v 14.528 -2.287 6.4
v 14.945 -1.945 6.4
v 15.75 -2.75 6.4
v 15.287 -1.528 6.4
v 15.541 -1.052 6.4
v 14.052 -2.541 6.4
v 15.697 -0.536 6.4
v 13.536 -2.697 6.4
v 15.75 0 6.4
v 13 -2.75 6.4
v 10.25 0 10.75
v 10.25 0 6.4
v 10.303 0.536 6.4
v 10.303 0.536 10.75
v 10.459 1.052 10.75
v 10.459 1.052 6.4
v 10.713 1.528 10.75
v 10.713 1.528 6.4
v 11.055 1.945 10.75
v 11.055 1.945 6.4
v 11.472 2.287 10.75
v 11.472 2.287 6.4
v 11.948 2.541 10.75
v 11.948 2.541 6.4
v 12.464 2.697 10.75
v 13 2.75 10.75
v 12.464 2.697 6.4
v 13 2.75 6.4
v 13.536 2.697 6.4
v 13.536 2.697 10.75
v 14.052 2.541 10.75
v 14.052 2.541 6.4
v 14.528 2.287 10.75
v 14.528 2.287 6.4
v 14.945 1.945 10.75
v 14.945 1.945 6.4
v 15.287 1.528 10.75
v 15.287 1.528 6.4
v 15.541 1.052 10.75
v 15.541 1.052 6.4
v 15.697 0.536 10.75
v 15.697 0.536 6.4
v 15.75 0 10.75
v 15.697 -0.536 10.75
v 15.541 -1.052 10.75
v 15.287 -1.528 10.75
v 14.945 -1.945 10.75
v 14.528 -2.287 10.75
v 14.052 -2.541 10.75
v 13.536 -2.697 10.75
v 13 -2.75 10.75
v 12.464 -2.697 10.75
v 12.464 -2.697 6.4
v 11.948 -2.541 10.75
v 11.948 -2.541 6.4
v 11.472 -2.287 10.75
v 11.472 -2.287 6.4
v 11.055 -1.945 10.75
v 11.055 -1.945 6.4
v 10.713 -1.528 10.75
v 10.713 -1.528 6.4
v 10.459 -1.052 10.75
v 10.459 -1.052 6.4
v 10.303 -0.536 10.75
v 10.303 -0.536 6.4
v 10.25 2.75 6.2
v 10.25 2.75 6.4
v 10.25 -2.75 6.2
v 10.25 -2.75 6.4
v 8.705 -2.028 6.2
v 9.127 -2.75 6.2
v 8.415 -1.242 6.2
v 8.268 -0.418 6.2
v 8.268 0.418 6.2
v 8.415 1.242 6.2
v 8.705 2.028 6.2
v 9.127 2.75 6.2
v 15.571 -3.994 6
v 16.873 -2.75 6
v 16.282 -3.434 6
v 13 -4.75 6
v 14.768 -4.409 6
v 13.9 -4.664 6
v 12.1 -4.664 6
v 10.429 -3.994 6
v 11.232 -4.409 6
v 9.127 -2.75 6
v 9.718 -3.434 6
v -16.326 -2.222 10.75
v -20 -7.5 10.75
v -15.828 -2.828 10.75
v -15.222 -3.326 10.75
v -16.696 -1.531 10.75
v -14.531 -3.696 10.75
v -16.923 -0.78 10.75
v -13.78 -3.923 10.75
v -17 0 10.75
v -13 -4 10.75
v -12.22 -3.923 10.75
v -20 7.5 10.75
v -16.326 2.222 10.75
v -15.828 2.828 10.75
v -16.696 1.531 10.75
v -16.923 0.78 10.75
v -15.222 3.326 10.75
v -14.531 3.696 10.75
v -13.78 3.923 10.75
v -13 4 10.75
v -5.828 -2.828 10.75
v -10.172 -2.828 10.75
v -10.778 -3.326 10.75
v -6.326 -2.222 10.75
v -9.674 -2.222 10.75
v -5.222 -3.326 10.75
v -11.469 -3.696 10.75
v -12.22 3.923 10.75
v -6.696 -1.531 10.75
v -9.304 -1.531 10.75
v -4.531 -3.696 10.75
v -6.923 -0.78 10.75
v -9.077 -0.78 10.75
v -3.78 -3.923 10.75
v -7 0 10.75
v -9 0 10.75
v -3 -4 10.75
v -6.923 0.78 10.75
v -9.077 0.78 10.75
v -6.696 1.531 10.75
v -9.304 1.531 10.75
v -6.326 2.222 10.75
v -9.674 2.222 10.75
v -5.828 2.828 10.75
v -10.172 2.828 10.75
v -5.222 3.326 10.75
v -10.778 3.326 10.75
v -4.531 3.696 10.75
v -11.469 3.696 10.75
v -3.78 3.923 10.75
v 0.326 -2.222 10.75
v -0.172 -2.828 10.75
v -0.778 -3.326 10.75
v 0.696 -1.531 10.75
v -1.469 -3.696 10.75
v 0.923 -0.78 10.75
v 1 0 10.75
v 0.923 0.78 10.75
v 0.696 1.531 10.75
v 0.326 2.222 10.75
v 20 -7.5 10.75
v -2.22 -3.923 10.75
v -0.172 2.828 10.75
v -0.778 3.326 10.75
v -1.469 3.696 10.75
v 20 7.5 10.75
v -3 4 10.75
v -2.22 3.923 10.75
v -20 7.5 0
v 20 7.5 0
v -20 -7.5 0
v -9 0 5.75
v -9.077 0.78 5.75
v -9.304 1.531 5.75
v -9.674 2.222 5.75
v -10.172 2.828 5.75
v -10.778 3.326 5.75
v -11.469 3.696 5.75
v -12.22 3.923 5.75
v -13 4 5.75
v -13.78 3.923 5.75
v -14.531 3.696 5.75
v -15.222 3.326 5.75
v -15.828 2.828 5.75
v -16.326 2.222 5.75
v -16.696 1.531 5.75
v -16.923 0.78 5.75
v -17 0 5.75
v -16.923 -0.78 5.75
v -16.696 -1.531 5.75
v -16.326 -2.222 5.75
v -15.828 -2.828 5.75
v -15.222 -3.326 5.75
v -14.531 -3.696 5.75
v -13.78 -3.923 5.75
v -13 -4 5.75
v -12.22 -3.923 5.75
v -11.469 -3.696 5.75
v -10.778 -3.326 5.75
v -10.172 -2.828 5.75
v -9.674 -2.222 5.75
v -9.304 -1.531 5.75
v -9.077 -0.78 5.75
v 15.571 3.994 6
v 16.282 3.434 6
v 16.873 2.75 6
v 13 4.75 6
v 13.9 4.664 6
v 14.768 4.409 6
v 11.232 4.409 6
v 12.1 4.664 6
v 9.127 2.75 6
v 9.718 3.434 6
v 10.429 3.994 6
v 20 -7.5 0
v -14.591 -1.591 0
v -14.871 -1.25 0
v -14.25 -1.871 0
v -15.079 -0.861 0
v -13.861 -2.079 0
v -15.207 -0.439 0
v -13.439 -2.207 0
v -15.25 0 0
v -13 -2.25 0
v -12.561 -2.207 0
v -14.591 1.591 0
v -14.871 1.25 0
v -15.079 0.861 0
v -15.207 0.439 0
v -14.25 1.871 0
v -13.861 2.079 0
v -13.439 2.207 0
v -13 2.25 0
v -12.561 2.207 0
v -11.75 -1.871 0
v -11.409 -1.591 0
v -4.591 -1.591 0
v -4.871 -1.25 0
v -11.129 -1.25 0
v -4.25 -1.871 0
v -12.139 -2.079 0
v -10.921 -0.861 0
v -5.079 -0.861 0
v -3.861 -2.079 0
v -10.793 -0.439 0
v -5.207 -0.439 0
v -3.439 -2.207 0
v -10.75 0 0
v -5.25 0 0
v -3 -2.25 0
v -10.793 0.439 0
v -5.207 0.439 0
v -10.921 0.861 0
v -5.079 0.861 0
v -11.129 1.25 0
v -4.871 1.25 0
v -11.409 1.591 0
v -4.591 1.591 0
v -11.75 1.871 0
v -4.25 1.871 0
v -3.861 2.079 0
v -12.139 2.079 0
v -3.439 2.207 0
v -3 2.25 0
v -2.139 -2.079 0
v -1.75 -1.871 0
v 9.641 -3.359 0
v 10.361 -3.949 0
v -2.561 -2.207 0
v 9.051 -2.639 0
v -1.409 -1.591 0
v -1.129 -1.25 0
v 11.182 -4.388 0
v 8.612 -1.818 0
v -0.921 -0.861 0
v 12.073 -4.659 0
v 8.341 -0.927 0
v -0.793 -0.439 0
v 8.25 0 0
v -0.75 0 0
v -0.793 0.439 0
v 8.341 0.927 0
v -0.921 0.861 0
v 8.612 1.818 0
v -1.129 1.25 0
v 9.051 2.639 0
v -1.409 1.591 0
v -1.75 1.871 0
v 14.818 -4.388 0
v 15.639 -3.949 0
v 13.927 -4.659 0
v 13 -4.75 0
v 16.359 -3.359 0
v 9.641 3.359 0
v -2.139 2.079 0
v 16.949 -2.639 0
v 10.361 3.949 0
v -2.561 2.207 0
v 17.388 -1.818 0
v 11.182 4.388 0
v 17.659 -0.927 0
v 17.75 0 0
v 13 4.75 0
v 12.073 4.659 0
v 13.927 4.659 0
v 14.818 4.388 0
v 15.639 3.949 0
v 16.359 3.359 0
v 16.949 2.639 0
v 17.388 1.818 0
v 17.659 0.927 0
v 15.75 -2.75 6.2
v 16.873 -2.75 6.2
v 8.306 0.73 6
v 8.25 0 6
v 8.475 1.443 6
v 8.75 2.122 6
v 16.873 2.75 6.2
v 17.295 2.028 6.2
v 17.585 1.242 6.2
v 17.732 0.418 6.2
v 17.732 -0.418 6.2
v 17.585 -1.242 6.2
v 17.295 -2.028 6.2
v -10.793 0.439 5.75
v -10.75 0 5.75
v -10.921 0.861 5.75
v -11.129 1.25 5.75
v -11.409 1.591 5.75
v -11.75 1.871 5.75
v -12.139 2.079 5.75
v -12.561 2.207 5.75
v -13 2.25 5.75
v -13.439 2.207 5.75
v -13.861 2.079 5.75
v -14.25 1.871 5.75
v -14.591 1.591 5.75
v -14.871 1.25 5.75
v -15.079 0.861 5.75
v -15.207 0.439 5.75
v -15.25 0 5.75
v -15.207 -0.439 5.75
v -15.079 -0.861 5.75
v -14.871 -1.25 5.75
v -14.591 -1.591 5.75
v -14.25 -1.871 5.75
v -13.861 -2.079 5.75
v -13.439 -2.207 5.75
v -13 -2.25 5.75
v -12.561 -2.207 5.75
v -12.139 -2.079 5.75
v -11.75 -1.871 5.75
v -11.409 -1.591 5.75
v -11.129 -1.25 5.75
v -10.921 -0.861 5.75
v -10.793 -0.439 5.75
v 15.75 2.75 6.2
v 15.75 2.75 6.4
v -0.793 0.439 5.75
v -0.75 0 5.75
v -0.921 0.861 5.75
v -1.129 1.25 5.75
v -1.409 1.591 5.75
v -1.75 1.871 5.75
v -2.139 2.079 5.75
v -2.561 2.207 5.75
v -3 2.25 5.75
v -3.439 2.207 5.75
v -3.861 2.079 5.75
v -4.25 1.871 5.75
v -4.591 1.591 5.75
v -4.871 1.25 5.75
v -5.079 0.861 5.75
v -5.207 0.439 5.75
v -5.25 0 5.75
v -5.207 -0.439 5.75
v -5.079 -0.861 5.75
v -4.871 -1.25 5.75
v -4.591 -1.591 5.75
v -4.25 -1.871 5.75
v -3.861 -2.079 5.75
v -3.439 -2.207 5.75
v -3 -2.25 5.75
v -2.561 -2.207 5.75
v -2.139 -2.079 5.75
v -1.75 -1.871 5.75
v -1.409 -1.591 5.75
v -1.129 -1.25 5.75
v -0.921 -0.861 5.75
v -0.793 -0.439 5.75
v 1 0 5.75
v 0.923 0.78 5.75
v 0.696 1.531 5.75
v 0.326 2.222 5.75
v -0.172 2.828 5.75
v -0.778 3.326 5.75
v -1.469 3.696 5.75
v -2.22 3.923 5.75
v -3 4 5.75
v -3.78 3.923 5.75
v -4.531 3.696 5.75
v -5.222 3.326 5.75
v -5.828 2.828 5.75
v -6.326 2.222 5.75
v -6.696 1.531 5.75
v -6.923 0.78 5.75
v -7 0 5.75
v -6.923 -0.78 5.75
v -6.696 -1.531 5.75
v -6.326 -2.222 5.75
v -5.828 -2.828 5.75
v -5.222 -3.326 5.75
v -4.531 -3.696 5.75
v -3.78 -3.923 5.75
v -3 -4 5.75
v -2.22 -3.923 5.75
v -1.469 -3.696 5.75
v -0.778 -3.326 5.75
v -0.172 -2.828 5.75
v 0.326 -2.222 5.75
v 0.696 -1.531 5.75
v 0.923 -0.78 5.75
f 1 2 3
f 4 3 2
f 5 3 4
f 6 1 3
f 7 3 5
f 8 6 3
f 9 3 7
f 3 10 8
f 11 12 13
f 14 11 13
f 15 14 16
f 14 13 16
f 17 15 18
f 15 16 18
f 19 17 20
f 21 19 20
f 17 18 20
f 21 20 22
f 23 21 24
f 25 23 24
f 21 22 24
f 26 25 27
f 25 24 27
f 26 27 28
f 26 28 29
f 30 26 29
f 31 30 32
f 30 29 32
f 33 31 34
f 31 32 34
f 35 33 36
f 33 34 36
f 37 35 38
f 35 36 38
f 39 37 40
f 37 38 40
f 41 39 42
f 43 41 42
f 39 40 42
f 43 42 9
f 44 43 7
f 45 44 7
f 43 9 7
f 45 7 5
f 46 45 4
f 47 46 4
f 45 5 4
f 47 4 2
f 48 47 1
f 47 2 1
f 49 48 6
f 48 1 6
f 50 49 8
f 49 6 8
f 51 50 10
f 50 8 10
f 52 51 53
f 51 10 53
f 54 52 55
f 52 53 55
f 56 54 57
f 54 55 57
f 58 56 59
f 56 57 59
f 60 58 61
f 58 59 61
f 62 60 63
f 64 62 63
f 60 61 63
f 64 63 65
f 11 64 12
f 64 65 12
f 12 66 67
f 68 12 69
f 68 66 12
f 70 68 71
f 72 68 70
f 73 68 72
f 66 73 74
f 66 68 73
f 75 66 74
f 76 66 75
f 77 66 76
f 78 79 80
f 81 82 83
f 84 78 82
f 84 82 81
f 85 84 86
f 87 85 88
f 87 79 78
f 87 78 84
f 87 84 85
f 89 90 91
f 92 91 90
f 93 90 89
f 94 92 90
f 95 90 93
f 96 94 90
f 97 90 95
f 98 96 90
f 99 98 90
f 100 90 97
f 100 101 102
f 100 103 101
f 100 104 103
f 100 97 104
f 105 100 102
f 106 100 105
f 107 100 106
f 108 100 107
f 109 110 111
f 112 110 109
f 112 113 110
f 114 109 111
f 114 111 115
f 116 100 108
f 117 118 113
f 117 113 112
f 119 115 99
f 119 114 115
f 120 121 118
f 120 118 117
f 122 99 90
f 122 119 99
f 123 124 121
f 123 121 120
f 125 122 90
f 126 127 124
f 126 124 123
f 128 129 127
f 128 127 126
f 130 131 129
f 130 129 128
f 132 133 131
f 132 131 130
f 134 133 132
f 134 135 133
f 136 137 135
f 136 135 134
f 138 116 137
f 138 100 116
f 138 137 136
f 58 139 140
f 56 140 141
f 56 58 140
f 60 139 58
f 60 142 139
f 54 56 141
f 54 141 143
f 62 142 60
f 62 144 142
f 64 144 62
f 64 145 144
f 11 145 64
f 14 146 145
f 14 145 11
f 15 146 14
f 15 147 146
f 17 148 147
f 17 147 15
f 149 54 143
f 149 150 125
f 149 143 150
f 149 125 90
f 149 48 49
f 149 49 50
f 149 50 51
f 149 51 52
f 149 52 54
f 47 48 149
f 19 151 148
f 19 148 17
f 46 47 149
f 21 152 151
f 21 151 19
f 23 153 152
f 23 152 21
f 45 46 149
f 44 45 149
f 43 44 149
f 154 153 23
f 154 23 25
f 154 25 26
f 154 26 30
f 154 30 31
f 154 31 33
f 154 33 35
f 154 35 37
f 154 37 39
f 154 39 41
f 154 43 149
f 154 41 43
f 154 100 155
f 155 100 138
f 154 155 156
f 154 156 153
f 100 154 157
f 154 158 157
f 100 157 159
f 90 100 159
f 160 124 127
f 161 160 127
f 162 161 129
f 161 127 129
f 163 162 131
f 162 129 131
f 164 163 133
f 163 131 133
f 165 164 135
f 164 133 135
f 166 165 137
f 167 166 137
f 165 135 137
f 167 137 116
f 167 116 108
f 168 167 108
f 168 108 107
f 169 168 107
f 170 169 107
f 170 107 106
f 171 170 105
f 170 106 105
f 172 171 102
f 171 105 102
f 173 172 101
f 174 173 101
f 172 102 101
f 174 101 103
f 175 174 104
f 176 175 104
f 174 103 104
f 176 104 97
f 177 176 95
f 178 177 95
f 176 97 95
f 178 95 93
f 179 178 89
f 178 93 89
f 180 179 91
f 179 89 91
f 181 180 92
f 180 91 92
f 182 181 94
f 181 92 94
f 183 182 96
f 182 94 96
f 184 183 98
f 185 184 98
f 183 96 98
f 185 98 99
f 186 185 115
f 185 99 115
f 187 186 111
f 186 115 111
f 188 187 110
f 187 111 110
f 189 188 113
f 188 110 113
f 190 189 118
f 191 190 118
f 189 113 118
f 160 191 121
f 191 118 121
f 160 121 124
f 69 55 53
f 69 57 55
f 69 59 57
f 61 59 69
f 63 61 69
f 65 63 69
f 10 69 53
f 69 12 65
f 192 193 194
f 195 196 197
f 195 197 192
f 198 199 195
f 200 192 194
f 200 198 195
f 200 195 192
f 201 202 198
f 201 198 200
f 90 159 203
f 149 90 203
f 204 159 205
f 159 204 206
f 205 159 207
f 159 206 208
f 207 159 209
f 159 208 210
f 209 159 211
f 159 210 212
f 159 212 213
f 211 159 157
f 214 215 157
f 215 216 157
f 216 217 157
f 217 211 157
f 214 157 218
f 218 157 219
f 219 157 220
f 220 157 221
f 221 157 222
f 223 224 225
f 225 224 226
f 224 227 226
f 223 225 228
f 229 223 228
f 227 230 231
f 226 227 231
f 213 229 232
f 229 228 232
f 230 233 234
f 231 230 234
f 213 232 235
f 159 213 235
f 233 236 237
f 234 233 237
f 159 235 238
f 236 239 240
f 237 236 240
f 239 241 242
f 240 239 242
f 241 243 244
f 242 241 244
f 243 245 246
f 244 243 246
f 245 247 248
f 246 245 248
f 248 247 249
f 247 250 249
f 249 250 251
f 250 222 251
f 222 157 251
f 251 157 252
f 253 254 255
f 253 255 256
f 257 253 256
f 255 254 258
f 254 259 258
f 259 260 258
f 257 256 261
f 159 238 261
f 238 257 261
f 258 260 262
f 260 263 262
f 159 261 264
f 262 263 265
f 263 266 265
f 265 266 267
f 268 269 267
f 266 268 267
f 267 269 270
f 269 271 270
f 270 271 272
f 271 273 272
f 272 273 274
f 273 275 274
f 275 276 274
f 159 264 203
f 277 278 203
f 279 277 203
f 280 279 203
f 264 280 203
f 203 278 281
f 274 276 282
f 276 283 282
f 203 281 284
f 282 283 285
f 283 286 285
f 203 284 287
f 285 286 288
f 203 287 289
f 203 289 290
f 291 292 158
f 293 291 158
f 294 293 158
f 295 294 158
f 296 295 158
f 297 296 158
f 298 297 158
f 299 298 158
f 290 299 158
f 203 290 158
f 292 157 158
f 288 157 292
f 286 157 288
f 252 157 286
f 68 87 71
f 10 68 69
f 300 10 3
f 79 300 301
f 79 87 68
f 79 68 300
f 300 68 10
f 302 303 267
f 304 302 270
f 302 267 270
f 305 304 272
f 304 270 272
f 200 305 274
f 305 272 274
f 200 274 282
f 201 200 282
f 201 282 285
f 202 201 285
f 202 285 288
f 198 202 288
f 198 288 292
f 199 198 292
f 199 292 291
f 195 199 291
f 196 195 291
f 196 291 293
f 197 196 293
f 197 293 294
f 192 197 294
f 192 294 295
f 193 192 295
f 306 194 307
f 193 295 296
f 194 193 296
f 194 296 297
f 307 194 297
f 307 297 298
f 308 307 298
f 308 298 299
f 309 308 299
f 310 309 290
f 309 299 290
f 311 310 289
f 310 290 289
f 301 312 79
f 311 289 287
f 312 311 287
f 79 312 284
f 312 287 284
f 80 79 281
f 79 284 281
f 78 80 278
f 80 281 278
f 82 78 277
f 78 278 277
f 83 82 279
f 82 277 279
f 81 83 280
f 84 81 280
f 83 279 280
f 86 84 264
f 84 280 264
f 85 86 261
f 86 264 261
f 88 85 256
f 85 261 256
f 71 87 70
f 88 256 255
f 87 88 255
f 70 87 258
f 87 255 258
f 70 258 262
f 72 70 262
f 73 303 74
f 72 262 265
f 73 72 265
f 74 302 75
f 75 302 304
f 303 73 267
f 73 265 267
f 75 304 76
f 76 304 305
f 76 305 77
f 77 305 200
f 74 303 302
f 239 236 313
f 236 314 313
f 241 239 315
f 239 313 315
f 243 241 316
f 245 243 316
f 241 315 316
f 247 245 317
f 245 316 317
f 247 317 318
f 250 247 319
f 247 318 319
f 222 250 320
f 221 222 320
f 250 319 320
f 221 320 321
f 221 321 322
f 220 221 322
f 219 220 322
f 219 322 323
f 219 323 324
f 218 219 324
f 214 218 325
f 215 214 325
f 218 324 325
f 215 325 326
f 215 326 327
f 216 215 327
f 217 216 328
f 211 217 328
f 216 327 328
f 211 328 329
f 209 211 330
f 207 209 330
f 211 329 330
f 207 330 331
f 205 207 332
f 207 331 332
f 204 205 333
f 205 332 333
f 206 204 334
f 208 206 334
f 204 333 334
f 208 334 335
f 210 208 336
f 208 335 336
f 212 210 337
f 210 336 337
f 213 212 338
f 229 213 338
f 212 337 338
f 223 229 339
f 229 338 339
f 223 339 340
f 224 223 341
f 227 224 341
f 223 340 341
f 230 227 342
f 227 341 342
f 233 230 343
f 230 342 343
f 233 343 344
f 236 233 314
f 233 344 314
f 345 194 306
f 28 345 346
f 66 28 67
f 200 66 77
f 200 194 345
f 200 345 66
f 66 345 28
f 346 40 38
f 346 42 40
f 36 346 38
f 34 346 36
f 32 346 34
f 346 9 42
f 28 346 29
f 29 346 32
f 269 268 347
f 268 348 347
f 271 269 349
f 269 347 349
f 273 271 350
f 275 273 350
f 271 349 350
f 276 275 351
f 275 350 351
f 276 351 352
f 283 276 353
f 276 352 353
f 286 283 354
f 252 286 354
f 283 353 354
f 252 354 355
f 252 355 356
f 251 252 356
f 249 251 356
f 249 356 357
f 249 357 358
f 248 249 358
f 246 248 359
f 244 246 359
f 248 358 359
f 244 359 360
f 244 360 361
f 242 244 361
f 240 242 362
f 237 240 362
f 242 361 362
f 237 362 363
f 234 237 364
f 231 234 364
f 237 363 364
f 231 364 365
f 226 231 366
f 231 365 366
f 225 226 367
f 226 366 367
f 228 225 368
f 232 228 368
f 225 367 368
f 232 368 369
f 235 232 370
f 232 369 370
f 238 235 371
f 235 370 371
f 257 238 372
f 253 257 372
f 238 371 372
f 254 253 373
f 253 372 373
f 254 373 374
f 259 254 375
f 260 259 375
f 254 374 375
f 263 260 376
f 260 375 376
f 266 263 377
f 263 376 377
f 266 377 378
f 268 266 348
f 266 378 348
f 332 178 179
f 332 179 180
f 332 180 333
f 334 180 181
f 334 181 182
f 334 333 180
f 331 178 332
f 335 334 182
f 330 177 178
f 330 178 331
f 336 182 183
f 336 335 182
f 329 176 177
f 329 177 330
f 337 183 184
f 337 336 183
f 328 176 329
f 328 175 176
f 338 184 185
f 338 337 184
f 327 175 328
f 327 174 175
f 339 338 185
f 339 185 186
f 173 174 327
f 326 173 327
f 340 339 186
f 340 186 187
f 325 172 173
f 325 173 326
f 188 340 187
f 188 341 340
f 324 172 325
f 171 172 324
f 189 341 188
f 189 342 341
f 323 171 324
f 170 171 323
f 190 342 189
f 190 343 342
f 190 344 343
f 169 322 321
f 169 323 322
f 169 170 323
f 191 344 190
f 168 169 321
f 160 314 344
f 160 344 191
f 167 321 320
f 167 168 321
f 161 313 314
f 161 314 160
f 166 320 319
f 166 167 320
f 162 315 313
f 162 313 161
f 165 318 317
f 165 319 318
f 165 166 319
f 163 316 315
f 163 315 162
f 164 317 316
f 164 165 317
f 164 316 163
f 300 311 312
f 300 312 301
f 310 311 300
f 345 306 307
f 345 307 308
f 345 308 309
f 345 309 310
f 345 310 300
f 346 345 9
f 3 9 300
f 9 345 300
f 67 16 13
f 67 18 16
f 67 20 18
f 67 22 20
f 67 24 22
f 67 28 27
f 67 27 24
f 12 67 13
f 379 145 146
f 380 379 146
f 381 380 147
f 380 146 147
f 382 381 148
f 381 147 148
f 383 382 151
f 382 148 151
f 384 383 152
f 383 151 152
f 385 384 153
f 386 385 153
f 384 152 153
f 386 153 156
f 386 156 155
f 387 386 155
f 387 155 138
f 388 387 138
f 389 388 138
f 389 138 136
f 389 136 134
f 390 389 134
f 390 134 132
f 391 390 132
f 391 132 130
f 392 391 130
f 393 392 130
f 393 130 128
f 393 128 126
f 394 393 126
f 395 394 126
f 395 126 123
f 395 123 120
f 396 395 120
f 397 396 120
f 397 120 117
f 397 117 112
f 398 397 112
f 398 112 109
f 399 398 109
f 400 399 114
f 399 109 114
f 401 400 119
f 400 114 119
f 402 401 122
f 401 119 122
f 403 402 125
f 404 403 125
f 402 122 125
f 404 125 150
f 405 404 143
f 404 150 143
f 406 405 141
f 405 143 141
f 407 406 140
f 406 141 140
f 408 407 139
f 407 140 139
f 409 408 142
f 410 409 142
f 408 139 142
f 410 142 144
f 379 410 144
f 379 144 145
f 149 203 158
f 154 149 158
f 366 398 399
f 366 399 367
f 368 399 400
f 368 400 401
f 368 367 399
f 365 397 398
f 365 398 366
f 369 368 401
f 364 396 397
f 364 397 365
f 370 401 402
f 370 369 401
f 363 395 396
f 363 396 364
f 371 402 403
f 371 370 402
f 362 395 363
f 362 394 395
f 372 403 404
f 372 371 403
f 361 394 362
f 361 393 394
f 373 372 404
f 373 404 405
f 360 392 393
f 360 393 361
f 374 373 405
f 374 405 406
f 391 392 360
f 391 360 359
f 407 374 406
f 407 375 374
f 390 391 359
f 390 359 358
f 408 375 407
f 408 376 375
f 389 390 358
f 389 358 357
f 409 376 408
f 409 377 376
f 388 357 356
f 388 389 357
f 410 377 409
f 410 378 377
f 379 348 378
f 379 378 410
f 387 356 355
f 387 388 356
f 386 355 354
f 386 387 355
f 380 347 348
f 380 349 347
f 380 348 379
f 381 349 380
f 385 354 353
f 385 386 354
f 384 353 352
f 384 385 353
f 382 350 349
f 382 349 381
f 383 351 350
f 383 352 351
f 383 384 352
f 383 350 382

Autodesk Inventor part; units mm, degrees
ref_plane "YZ Plane" through (0, 0, 0) normal (1, 0, 0) x (0, 1, 0)
ref_plane "XZ Plane" through (0, 0, 0) normal (0, 1, 0) x (-1, 0, 0)
ref_plane "XY Plane" through (0, 0, 0) normal (0, 0, 1) x (1, 0, 0)
sketch "Sketch1" plane through (0, 0, 0) normal (0, 0, 1) x (1, 0, 0)
  line L0 (-20, -7.5) -> (20, -7.5)
  line L1 (20, -7.5) -> (20, 7.5)
  line L2 (20, 7.5) -> (-20, 7.5)
  line L3 (-20, 7.5) -> (-20, -7.5)
  line L4 (-20, -7.5) -> (20, 7.5) construction
  line L5 (20, -7.5) -> (-20, 7.5) construction
  point P0 (0, 0)
  dimension "d0" = 15
  dimension "d1" = 40
extrude "Extrusion1" add sketch "Sketch1" along normal blind 10.75
sketch "Sketch2" plane through (0, 0, 10.75) normal (0, 0, 1) x (1, 0, 0)
  line L0 (-20, 7.5) -> (-20, -7.5) construction
  line L1 (-20, 0) -> (-13, 0) construction
  line L2 (-13, 0) -> (-3, 0) construction
  circle A0 centre (-13, 0) radius 2.25
  circle A1 centre (-3, 0) radius 2.25
  point P0 (0, 0)
  dimension "d4" = 10
  dimension "d5" = 7
  dimension "d6" = 4.5
extrude "Extrusion2" cut sketch "Sketch2" against normal through all
sketch "Sketch3" plane through (0, 0, 10.75) normal (0, 0, 1) x (1, 0, 0)
  circle A0 centre (-13, 0) radius 2.25 projected
  circle A1 centre (-13, 0) radius 4
  circle A2 centre (-3, 0) radius 2.25 projected
  circle A3 centre (-3, 0) radius 4
  point P0 (0, 0)
  dimension "d9" = 8
extrude "Extrusion3" cut sketch "Sketch3" against normal blind 5 contours A0 | A1 | A2 | A3
sketch "Sketch4" plane through (0, 0, 0) normal (0, 0, -1) x (-1, 0, 0)
  line L0 (-20, -7.5) -> (-20, 7.5) construction
  line L1 (-20, 0) -> (-13, 0) construction
  circle A0 centre (-13, 0) radius 2.75
  point P0 (0, 0)
  dimension "d12" = 5.5
  dimension "d13" = 7
extrude "Extrusion4" cut sketch "Sketch4" against normal through all
sketch "Sketch5" plane through (0, 0, 0) normal (0, 0, -1) x (-1, 0, 0)
  circle A0 centre (-13, 0) radius 2.75 projected
  circle A1 centre (-13, 0) radius 4.75
  point P0 (0, 0)
  dimension "d16" = 9.5
extrude "Extrusion5" cut sketch "Sketch5" against normal blind 6 contours A0 | A1
sketch "Sketch6" plane through (13, 0, 6) normal (0, 0, -1) x (-1, 0, 0)
  line L0 (5.3295, 6.8206) -> (-5.8691, 6.8206)
  line L1 (-5.8691, 6.8206) -> (-5.8691, 2.75)
  line L2 (-5.8691, 2.75) -> (5.3295, 2.75)
  line L3 (5.3295, 2.75) -> (5.3295, 6.8206)
  line L4 (6.0982, -2.75) -> (-4.6287, -2.75)
  line L5 (-4.6287, -2.75) -> (-4.6287, -7.6942)
  line L6 (-4.6287, -7.6942) -> (6.0982, -7.6942)
  line L7 (6.0982, -7.6942) -> (6.0982, -2.75)
  circle A0 centre (0, 0) radius 2.75 projected
  circle A1 centre (0, 0) radius 4.75 projected
  point P0 (13, 0)
  point P1 (-3.873, 2.75)
  point P2 (-3.873, -2.75)
  point P3 (0, -2.75)
  point P4 (0, 2.75)
  point P5 (3.873, 2.75)
  point P6 (3.873, -2.75)
extrude "Extrusion6" cut sketch "Sketch6" against normal blind 0.2 contours A1 L4 A0 L2 | L2 A0 L4 A1
sketch "Sketch7" plane through (13, 0, 6.2) normal (0, 0, -1) x (-1, 0, 0)
  line L0 (3.873, -2.75) -> (0, -2.75) projected
  arc A0 (3.873, -2.75) -> (3.873, 2.75) centre (0, 0) ccw projected
  line L1 (0, 2.75) -> (3.873, 2.75) projected
  arc A1 (0, -2.75) -> (0, 2.75) centre (0, 0) ccw projected
  line L2 (-3.873, 2.75) -> (0, 2.75) projected
  arc A2 (-3.873, 2.75) -> (-3.873, -2.75) centre (0, 0) ccw projected
  line L3 (0, -2.75) -> (-3.873, -2.75) projected
  arc A3 (0, 2.75) -> (0, -2.75) centre (0, 0) ccw projected
  line L4 (7.5317, 4.6908) -> (2.75, 4.6908)
  line L5 (2.75, 4.6908) -> (2.75, -4.4637)
  line L6 (2.75, -4.4637) -> (7.5317, -4.4637)
  line L7 (7.5317, -4.4637) -> (7.5317, 4.6908)
  line L8 (-5.9646, 6.0361) -> (-2.75, 6.0361)
  line L9 (-2.75, 6.0361) -> (-2.75, -5.4071)
  line L10 (-2.75, -5.4071) -> (-5.9646, -5.4071)
  line L11 (-5.9646, -5.4071) -> (-5.9646, 6.0361)
  arc A4 (0, -2.75) -> (0, 2.75) centre (0, 0) ccw projected
  point P0 (13, 0)
  point P1 (-2.75, 2.75)
  point P2 (-2.75, 0)
  point P3 (2.75, 0)
  point P4 (2.75, 2.75)
  point P5 (2.75, -2.75)
  point P6 (-2.75, -2.75)
extrude "Extrusion7" cut sketch "Sketch7" against normal blind 0.2 contours L0 A1 L5 | L3 L9 A3 | A1 L1 L5 | L9 L2 A3
properties part number "LoadCellMount"
